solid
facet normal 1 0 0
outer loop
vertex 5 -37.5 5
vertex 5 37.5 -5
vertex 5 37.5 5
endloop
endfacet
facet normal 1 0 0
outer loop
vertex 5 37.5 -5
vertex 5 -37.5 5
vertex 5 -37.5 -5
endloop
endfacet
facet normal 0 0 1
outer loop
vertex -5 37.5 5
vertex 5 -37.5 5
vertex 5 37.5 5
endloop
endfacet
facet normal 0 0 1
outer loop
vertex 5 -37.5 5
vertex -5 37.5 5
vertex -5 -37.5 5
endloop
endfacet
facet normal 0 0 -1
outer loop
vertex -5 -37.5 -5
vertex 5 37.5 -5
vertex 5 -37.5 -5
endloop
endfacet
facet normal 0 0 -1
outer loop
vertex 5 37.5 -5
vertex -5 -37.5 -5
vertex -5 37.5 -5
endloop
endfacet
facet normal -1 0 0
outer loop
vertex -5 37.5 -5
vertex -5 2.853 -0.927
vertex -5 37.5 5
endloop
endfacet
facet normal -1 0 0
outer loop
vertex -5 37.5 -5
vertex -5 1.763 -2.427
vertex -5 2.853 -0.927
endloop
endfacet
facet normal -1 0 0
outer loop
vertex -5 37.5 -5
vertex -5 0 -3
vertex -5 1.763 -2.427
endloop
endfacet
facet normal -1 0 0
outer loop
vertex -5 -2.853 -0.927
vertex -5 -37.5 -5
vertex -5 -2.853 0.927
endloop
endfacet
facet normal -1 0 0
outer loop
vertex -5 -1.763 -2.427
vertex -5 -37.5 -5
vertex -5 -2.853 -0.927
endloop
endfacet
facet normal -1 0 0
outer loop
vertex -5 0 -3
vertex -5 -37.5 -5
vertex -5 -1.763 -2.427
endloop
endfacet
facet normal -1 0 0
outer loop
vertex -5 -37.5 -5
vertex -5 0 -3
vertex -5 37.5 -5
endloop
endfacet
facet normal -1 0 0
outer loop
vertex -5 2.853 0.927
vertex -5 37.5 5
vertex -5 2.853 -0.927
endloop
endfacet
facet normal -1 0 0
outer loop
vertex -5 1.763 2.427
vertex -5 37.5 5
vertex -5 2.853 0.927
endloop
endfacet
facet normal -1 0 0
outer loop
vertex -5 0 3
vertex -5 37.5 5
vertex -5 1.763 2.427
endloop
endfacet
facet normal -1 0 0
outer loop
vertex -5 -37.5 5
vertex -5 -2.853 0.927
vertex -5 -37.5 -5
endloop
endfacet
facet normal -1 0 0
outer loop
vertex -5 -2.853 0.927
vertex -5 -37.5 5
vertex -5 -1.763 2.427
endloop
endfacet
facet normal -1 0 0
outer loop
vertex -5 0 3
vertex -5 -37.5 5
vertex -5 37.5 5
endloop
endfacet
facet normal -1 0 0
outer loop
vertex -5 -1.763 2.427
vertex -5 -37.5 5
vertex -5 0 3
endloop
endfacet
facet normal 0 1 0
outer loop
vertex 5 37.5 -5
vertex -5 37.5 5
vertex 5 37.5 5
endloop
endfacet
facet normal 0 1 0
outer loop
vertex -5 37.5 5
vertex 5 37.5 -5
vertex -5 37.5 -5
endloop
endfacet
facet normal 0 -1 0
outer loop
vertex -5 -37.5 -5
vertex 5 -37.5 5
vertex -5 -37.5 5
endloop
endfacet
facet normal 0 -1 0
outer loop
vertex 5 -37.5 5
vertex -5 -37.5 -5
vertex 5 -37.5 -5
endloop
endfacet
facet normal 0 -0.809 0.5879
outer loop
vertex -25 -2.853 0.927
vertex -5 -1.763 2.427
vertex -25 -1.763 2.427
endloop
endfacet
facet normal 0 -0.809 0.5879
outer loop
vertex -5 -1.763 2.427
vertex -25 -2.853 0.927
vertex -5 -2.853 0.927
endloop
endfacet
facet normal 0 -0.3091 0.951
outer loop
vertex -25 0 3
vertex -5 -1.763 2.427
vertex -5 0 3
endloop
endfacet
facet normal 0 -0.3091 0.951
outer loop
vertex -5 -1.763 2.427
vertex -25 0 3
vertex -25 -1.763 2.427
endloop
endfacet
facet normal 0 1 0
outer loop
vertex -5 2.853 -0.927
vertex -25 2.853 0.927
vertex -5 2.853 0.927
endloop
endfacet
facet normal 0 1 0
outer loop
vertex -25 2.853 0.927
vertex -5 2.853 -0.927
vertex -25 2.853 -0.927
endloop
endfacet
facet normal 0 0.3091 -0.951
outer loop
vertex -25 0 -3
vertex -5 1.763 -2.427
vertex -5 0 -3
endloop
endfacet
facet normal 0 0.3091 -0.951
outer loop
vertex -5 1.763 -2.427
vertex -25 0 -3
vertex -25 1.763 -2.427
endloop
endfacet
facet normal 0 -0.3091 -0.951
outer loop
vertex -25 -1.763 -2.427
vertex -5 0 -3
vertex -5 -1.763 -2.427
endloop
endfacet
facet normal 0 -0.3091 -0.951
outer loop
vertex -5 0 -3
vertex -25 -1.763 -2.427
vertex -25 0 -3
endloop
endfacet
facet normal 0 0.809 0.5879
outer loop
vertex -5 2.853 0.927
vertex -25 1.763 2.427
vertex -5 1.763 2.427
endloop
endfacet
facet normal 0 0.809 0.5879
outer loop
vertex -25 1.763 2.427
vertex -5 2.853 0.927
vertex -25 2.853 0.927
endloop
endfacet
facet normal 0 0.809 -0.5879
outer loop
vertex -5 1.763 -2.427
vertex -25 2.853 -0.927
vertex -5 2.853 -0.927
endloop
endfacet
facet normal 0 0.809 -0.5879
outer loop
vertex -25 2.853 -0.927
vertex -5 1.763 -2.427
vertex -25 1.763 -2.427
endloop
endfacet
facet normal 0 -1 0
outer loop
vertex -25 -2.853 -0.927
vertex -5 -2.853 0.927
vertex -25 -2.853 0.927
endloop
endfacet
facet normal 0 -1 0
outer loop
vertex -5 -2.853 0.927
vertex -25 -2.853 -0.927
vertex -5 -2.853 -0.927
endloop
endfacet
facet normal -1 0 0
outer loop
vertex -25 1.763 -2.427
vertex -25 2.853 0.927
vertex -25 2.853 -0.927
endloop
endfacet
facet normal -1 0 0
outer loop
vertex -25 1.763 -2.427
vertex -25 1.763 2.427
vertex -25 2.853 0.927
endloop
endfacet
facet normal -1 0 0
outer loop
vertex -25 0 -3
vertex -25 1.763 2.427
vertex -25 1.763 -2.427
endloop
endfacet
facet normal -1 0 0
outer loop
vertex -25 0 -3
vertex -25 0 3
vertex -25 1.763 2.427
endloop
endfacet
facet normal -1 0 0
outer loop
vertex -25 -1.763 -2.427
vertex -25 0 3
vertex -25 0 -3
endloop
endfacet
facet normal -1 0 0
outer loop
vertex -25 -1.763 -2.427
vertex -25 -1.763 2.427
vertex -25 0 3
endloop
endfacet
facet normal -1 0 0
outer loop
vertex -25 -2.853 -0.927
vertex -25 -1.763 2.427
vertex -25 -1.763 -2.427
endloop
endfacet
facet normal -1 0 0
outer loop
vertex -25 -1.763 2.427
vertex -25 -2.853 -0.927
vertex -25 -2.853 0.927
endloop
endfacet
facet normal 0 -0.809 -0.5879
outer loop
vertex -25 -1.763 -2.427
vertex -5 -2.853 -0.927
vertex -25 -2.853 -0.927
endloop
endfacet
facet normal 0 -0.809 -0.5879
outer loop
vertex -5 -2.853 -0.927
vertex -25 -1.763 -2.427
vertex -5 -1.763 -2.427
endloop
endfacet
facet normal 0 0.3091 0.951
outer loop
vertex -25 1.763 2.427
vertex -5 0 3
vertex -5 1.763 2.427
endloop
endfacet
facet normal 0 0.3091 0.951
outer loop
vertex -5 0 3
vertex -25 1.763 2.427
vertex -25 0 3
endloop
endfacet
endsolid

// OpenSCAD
// file: ../fixings/tube_clamp_square_base_plate_132_functions.scad
function get_L_shaft_with_base_plate_square_base_plate_132(beam_width) = 
    // (beam_width == 40) ?
    75
;
function get_R_plate_square_base_plate_132(beam_width) = 
    // (beam_width == 40) ?
    [143, 75, 18.5]
;
function get_thickness_square_base_plate_132(beam_width) = 
    // (beam_width == 40) ?
    8
;
function get_offset_hole_x_square_base_plate_132(beam_width) = 
    // (beam_width == 40) ?
    100 / 2
;
function get_diameter_hole_square_base_plate_132(beam_width) = 
    // (beam_width == 40) ?
    10
;
// file: ../fixings/tube_clamp_round_base_plate_132_functions.scad
function get_L_shaft_with_base_plate_round_base_plate_132(tube_diameter) = 
    (tube_diameter == 27) ? 
        85
    : (tube_diameter == 42) ?
        122
    : 25
;
function get_R_plate_round_base_plate_132(tube_diameter) = 
    (tube_diameter == 27) ? 
        [64, 114, 7]
    : (tube_diameter == 42) ?
        [80, 140, 10]
    : [10, 20, 1]
;
function get_offset_hole_y_round_base_plate_132(tube_diameter) = 
    (tube_diameter == 27) ? 
        38
    : (tube_diameter == 42) ?
        50
    : 10
;
function get_diameter_hole_round_base_plate_132(tube_diameter) = 10;
// file: ../fixings/tube_clamp_round_3_way_through_116_functions.scad
function  get_L_shaft_long_round_3_way_through_116(tube_diameter) = 
    (tube_diameter == 27) ? 
        42
    : (tube_diameter == 42) ?
        60
    : 25
;
function get_thickness_round_3_way_through_116(tube_diameter) = 7;
function get_L_shaft_short_round_3_way_through_116(tube_diameter) = tube_diameter + 2 * get_thickness_round_3_way_through_116();
// file: ../fixings/tube_clamp_round_tee_long_104_functions.scad
// include <../../config.scad>;

function get_L_shaft_long_round_tee_long_104(tube_diameter) = 
    (tube_diameter == 27) ? 
        85
    : (tube_diameter == 42) ?
        122
    : 25
;
function get_L_shaft_short_round_tee_long_104(tube_diameter) = 
    (tube_diameter == 27) ? 
        42
    : (tube_diameter == 42) ?
        61
    : 10
;
// file: brake_assembly_functions.scad
// include <../../config.scad>; // circular reference!

function get_y_pos_lead_fixing_ballscrew_to_brake_arms(angle_brake_rod, y_pos_axle_rear, x_pos_axle_leg_rear, x_offset_fixing_brake_arm_to_lead_plate) = y_pos_axle_rear + (x_pos_axle_leg_rear - x_offset_fixing_brake_arm_to_lead_plate) / tan(angle_brake_rod); // (X_POS_AXLE_LEG_REAR - X_OFFSET_FIXING_BRAKE_ARM_TO_LEAD_PLATE)
// file: ../common/metric_bolt_functions.scad
function get_metric_bolt_head_height(size) = size;
function get_metric_bolt_head_diameter(size) = size * 2;
function get_metric_bolt_washer_diameter_safe_working_clearance(size) = 
    (size < 20) ?
        4 * size
    :
        3 * size
;
// main file
include <../../config.scad>;


module brake_pad() {
    union() {
        color("black") cube(R_BRAKE_PAD, center = true);
        color("gray") translate([-R_BRAKE_PAD[0] / 2 - L_BOLT_FIXING_BRAKE_ARM_TO_BRAKE_PAD / 2, 0, 0]) rotate([0, 90, 0]) cylinder(L_BOLT_FIXING_BRAKE_ARM_TO_BRAKE_PAD, SIZE_BOLT_FIXING_BRAKE_ARM_TO_BRAKE_PAD / 2, SIZE_BOLT_FIXING_BRAKE_ARM_TO_BRAKE_PAD / 2, center = true);
    }
    // Shopping
    echo(str("Brake pad: Bike V-brake pad - x1"));
}

brake_pad();
